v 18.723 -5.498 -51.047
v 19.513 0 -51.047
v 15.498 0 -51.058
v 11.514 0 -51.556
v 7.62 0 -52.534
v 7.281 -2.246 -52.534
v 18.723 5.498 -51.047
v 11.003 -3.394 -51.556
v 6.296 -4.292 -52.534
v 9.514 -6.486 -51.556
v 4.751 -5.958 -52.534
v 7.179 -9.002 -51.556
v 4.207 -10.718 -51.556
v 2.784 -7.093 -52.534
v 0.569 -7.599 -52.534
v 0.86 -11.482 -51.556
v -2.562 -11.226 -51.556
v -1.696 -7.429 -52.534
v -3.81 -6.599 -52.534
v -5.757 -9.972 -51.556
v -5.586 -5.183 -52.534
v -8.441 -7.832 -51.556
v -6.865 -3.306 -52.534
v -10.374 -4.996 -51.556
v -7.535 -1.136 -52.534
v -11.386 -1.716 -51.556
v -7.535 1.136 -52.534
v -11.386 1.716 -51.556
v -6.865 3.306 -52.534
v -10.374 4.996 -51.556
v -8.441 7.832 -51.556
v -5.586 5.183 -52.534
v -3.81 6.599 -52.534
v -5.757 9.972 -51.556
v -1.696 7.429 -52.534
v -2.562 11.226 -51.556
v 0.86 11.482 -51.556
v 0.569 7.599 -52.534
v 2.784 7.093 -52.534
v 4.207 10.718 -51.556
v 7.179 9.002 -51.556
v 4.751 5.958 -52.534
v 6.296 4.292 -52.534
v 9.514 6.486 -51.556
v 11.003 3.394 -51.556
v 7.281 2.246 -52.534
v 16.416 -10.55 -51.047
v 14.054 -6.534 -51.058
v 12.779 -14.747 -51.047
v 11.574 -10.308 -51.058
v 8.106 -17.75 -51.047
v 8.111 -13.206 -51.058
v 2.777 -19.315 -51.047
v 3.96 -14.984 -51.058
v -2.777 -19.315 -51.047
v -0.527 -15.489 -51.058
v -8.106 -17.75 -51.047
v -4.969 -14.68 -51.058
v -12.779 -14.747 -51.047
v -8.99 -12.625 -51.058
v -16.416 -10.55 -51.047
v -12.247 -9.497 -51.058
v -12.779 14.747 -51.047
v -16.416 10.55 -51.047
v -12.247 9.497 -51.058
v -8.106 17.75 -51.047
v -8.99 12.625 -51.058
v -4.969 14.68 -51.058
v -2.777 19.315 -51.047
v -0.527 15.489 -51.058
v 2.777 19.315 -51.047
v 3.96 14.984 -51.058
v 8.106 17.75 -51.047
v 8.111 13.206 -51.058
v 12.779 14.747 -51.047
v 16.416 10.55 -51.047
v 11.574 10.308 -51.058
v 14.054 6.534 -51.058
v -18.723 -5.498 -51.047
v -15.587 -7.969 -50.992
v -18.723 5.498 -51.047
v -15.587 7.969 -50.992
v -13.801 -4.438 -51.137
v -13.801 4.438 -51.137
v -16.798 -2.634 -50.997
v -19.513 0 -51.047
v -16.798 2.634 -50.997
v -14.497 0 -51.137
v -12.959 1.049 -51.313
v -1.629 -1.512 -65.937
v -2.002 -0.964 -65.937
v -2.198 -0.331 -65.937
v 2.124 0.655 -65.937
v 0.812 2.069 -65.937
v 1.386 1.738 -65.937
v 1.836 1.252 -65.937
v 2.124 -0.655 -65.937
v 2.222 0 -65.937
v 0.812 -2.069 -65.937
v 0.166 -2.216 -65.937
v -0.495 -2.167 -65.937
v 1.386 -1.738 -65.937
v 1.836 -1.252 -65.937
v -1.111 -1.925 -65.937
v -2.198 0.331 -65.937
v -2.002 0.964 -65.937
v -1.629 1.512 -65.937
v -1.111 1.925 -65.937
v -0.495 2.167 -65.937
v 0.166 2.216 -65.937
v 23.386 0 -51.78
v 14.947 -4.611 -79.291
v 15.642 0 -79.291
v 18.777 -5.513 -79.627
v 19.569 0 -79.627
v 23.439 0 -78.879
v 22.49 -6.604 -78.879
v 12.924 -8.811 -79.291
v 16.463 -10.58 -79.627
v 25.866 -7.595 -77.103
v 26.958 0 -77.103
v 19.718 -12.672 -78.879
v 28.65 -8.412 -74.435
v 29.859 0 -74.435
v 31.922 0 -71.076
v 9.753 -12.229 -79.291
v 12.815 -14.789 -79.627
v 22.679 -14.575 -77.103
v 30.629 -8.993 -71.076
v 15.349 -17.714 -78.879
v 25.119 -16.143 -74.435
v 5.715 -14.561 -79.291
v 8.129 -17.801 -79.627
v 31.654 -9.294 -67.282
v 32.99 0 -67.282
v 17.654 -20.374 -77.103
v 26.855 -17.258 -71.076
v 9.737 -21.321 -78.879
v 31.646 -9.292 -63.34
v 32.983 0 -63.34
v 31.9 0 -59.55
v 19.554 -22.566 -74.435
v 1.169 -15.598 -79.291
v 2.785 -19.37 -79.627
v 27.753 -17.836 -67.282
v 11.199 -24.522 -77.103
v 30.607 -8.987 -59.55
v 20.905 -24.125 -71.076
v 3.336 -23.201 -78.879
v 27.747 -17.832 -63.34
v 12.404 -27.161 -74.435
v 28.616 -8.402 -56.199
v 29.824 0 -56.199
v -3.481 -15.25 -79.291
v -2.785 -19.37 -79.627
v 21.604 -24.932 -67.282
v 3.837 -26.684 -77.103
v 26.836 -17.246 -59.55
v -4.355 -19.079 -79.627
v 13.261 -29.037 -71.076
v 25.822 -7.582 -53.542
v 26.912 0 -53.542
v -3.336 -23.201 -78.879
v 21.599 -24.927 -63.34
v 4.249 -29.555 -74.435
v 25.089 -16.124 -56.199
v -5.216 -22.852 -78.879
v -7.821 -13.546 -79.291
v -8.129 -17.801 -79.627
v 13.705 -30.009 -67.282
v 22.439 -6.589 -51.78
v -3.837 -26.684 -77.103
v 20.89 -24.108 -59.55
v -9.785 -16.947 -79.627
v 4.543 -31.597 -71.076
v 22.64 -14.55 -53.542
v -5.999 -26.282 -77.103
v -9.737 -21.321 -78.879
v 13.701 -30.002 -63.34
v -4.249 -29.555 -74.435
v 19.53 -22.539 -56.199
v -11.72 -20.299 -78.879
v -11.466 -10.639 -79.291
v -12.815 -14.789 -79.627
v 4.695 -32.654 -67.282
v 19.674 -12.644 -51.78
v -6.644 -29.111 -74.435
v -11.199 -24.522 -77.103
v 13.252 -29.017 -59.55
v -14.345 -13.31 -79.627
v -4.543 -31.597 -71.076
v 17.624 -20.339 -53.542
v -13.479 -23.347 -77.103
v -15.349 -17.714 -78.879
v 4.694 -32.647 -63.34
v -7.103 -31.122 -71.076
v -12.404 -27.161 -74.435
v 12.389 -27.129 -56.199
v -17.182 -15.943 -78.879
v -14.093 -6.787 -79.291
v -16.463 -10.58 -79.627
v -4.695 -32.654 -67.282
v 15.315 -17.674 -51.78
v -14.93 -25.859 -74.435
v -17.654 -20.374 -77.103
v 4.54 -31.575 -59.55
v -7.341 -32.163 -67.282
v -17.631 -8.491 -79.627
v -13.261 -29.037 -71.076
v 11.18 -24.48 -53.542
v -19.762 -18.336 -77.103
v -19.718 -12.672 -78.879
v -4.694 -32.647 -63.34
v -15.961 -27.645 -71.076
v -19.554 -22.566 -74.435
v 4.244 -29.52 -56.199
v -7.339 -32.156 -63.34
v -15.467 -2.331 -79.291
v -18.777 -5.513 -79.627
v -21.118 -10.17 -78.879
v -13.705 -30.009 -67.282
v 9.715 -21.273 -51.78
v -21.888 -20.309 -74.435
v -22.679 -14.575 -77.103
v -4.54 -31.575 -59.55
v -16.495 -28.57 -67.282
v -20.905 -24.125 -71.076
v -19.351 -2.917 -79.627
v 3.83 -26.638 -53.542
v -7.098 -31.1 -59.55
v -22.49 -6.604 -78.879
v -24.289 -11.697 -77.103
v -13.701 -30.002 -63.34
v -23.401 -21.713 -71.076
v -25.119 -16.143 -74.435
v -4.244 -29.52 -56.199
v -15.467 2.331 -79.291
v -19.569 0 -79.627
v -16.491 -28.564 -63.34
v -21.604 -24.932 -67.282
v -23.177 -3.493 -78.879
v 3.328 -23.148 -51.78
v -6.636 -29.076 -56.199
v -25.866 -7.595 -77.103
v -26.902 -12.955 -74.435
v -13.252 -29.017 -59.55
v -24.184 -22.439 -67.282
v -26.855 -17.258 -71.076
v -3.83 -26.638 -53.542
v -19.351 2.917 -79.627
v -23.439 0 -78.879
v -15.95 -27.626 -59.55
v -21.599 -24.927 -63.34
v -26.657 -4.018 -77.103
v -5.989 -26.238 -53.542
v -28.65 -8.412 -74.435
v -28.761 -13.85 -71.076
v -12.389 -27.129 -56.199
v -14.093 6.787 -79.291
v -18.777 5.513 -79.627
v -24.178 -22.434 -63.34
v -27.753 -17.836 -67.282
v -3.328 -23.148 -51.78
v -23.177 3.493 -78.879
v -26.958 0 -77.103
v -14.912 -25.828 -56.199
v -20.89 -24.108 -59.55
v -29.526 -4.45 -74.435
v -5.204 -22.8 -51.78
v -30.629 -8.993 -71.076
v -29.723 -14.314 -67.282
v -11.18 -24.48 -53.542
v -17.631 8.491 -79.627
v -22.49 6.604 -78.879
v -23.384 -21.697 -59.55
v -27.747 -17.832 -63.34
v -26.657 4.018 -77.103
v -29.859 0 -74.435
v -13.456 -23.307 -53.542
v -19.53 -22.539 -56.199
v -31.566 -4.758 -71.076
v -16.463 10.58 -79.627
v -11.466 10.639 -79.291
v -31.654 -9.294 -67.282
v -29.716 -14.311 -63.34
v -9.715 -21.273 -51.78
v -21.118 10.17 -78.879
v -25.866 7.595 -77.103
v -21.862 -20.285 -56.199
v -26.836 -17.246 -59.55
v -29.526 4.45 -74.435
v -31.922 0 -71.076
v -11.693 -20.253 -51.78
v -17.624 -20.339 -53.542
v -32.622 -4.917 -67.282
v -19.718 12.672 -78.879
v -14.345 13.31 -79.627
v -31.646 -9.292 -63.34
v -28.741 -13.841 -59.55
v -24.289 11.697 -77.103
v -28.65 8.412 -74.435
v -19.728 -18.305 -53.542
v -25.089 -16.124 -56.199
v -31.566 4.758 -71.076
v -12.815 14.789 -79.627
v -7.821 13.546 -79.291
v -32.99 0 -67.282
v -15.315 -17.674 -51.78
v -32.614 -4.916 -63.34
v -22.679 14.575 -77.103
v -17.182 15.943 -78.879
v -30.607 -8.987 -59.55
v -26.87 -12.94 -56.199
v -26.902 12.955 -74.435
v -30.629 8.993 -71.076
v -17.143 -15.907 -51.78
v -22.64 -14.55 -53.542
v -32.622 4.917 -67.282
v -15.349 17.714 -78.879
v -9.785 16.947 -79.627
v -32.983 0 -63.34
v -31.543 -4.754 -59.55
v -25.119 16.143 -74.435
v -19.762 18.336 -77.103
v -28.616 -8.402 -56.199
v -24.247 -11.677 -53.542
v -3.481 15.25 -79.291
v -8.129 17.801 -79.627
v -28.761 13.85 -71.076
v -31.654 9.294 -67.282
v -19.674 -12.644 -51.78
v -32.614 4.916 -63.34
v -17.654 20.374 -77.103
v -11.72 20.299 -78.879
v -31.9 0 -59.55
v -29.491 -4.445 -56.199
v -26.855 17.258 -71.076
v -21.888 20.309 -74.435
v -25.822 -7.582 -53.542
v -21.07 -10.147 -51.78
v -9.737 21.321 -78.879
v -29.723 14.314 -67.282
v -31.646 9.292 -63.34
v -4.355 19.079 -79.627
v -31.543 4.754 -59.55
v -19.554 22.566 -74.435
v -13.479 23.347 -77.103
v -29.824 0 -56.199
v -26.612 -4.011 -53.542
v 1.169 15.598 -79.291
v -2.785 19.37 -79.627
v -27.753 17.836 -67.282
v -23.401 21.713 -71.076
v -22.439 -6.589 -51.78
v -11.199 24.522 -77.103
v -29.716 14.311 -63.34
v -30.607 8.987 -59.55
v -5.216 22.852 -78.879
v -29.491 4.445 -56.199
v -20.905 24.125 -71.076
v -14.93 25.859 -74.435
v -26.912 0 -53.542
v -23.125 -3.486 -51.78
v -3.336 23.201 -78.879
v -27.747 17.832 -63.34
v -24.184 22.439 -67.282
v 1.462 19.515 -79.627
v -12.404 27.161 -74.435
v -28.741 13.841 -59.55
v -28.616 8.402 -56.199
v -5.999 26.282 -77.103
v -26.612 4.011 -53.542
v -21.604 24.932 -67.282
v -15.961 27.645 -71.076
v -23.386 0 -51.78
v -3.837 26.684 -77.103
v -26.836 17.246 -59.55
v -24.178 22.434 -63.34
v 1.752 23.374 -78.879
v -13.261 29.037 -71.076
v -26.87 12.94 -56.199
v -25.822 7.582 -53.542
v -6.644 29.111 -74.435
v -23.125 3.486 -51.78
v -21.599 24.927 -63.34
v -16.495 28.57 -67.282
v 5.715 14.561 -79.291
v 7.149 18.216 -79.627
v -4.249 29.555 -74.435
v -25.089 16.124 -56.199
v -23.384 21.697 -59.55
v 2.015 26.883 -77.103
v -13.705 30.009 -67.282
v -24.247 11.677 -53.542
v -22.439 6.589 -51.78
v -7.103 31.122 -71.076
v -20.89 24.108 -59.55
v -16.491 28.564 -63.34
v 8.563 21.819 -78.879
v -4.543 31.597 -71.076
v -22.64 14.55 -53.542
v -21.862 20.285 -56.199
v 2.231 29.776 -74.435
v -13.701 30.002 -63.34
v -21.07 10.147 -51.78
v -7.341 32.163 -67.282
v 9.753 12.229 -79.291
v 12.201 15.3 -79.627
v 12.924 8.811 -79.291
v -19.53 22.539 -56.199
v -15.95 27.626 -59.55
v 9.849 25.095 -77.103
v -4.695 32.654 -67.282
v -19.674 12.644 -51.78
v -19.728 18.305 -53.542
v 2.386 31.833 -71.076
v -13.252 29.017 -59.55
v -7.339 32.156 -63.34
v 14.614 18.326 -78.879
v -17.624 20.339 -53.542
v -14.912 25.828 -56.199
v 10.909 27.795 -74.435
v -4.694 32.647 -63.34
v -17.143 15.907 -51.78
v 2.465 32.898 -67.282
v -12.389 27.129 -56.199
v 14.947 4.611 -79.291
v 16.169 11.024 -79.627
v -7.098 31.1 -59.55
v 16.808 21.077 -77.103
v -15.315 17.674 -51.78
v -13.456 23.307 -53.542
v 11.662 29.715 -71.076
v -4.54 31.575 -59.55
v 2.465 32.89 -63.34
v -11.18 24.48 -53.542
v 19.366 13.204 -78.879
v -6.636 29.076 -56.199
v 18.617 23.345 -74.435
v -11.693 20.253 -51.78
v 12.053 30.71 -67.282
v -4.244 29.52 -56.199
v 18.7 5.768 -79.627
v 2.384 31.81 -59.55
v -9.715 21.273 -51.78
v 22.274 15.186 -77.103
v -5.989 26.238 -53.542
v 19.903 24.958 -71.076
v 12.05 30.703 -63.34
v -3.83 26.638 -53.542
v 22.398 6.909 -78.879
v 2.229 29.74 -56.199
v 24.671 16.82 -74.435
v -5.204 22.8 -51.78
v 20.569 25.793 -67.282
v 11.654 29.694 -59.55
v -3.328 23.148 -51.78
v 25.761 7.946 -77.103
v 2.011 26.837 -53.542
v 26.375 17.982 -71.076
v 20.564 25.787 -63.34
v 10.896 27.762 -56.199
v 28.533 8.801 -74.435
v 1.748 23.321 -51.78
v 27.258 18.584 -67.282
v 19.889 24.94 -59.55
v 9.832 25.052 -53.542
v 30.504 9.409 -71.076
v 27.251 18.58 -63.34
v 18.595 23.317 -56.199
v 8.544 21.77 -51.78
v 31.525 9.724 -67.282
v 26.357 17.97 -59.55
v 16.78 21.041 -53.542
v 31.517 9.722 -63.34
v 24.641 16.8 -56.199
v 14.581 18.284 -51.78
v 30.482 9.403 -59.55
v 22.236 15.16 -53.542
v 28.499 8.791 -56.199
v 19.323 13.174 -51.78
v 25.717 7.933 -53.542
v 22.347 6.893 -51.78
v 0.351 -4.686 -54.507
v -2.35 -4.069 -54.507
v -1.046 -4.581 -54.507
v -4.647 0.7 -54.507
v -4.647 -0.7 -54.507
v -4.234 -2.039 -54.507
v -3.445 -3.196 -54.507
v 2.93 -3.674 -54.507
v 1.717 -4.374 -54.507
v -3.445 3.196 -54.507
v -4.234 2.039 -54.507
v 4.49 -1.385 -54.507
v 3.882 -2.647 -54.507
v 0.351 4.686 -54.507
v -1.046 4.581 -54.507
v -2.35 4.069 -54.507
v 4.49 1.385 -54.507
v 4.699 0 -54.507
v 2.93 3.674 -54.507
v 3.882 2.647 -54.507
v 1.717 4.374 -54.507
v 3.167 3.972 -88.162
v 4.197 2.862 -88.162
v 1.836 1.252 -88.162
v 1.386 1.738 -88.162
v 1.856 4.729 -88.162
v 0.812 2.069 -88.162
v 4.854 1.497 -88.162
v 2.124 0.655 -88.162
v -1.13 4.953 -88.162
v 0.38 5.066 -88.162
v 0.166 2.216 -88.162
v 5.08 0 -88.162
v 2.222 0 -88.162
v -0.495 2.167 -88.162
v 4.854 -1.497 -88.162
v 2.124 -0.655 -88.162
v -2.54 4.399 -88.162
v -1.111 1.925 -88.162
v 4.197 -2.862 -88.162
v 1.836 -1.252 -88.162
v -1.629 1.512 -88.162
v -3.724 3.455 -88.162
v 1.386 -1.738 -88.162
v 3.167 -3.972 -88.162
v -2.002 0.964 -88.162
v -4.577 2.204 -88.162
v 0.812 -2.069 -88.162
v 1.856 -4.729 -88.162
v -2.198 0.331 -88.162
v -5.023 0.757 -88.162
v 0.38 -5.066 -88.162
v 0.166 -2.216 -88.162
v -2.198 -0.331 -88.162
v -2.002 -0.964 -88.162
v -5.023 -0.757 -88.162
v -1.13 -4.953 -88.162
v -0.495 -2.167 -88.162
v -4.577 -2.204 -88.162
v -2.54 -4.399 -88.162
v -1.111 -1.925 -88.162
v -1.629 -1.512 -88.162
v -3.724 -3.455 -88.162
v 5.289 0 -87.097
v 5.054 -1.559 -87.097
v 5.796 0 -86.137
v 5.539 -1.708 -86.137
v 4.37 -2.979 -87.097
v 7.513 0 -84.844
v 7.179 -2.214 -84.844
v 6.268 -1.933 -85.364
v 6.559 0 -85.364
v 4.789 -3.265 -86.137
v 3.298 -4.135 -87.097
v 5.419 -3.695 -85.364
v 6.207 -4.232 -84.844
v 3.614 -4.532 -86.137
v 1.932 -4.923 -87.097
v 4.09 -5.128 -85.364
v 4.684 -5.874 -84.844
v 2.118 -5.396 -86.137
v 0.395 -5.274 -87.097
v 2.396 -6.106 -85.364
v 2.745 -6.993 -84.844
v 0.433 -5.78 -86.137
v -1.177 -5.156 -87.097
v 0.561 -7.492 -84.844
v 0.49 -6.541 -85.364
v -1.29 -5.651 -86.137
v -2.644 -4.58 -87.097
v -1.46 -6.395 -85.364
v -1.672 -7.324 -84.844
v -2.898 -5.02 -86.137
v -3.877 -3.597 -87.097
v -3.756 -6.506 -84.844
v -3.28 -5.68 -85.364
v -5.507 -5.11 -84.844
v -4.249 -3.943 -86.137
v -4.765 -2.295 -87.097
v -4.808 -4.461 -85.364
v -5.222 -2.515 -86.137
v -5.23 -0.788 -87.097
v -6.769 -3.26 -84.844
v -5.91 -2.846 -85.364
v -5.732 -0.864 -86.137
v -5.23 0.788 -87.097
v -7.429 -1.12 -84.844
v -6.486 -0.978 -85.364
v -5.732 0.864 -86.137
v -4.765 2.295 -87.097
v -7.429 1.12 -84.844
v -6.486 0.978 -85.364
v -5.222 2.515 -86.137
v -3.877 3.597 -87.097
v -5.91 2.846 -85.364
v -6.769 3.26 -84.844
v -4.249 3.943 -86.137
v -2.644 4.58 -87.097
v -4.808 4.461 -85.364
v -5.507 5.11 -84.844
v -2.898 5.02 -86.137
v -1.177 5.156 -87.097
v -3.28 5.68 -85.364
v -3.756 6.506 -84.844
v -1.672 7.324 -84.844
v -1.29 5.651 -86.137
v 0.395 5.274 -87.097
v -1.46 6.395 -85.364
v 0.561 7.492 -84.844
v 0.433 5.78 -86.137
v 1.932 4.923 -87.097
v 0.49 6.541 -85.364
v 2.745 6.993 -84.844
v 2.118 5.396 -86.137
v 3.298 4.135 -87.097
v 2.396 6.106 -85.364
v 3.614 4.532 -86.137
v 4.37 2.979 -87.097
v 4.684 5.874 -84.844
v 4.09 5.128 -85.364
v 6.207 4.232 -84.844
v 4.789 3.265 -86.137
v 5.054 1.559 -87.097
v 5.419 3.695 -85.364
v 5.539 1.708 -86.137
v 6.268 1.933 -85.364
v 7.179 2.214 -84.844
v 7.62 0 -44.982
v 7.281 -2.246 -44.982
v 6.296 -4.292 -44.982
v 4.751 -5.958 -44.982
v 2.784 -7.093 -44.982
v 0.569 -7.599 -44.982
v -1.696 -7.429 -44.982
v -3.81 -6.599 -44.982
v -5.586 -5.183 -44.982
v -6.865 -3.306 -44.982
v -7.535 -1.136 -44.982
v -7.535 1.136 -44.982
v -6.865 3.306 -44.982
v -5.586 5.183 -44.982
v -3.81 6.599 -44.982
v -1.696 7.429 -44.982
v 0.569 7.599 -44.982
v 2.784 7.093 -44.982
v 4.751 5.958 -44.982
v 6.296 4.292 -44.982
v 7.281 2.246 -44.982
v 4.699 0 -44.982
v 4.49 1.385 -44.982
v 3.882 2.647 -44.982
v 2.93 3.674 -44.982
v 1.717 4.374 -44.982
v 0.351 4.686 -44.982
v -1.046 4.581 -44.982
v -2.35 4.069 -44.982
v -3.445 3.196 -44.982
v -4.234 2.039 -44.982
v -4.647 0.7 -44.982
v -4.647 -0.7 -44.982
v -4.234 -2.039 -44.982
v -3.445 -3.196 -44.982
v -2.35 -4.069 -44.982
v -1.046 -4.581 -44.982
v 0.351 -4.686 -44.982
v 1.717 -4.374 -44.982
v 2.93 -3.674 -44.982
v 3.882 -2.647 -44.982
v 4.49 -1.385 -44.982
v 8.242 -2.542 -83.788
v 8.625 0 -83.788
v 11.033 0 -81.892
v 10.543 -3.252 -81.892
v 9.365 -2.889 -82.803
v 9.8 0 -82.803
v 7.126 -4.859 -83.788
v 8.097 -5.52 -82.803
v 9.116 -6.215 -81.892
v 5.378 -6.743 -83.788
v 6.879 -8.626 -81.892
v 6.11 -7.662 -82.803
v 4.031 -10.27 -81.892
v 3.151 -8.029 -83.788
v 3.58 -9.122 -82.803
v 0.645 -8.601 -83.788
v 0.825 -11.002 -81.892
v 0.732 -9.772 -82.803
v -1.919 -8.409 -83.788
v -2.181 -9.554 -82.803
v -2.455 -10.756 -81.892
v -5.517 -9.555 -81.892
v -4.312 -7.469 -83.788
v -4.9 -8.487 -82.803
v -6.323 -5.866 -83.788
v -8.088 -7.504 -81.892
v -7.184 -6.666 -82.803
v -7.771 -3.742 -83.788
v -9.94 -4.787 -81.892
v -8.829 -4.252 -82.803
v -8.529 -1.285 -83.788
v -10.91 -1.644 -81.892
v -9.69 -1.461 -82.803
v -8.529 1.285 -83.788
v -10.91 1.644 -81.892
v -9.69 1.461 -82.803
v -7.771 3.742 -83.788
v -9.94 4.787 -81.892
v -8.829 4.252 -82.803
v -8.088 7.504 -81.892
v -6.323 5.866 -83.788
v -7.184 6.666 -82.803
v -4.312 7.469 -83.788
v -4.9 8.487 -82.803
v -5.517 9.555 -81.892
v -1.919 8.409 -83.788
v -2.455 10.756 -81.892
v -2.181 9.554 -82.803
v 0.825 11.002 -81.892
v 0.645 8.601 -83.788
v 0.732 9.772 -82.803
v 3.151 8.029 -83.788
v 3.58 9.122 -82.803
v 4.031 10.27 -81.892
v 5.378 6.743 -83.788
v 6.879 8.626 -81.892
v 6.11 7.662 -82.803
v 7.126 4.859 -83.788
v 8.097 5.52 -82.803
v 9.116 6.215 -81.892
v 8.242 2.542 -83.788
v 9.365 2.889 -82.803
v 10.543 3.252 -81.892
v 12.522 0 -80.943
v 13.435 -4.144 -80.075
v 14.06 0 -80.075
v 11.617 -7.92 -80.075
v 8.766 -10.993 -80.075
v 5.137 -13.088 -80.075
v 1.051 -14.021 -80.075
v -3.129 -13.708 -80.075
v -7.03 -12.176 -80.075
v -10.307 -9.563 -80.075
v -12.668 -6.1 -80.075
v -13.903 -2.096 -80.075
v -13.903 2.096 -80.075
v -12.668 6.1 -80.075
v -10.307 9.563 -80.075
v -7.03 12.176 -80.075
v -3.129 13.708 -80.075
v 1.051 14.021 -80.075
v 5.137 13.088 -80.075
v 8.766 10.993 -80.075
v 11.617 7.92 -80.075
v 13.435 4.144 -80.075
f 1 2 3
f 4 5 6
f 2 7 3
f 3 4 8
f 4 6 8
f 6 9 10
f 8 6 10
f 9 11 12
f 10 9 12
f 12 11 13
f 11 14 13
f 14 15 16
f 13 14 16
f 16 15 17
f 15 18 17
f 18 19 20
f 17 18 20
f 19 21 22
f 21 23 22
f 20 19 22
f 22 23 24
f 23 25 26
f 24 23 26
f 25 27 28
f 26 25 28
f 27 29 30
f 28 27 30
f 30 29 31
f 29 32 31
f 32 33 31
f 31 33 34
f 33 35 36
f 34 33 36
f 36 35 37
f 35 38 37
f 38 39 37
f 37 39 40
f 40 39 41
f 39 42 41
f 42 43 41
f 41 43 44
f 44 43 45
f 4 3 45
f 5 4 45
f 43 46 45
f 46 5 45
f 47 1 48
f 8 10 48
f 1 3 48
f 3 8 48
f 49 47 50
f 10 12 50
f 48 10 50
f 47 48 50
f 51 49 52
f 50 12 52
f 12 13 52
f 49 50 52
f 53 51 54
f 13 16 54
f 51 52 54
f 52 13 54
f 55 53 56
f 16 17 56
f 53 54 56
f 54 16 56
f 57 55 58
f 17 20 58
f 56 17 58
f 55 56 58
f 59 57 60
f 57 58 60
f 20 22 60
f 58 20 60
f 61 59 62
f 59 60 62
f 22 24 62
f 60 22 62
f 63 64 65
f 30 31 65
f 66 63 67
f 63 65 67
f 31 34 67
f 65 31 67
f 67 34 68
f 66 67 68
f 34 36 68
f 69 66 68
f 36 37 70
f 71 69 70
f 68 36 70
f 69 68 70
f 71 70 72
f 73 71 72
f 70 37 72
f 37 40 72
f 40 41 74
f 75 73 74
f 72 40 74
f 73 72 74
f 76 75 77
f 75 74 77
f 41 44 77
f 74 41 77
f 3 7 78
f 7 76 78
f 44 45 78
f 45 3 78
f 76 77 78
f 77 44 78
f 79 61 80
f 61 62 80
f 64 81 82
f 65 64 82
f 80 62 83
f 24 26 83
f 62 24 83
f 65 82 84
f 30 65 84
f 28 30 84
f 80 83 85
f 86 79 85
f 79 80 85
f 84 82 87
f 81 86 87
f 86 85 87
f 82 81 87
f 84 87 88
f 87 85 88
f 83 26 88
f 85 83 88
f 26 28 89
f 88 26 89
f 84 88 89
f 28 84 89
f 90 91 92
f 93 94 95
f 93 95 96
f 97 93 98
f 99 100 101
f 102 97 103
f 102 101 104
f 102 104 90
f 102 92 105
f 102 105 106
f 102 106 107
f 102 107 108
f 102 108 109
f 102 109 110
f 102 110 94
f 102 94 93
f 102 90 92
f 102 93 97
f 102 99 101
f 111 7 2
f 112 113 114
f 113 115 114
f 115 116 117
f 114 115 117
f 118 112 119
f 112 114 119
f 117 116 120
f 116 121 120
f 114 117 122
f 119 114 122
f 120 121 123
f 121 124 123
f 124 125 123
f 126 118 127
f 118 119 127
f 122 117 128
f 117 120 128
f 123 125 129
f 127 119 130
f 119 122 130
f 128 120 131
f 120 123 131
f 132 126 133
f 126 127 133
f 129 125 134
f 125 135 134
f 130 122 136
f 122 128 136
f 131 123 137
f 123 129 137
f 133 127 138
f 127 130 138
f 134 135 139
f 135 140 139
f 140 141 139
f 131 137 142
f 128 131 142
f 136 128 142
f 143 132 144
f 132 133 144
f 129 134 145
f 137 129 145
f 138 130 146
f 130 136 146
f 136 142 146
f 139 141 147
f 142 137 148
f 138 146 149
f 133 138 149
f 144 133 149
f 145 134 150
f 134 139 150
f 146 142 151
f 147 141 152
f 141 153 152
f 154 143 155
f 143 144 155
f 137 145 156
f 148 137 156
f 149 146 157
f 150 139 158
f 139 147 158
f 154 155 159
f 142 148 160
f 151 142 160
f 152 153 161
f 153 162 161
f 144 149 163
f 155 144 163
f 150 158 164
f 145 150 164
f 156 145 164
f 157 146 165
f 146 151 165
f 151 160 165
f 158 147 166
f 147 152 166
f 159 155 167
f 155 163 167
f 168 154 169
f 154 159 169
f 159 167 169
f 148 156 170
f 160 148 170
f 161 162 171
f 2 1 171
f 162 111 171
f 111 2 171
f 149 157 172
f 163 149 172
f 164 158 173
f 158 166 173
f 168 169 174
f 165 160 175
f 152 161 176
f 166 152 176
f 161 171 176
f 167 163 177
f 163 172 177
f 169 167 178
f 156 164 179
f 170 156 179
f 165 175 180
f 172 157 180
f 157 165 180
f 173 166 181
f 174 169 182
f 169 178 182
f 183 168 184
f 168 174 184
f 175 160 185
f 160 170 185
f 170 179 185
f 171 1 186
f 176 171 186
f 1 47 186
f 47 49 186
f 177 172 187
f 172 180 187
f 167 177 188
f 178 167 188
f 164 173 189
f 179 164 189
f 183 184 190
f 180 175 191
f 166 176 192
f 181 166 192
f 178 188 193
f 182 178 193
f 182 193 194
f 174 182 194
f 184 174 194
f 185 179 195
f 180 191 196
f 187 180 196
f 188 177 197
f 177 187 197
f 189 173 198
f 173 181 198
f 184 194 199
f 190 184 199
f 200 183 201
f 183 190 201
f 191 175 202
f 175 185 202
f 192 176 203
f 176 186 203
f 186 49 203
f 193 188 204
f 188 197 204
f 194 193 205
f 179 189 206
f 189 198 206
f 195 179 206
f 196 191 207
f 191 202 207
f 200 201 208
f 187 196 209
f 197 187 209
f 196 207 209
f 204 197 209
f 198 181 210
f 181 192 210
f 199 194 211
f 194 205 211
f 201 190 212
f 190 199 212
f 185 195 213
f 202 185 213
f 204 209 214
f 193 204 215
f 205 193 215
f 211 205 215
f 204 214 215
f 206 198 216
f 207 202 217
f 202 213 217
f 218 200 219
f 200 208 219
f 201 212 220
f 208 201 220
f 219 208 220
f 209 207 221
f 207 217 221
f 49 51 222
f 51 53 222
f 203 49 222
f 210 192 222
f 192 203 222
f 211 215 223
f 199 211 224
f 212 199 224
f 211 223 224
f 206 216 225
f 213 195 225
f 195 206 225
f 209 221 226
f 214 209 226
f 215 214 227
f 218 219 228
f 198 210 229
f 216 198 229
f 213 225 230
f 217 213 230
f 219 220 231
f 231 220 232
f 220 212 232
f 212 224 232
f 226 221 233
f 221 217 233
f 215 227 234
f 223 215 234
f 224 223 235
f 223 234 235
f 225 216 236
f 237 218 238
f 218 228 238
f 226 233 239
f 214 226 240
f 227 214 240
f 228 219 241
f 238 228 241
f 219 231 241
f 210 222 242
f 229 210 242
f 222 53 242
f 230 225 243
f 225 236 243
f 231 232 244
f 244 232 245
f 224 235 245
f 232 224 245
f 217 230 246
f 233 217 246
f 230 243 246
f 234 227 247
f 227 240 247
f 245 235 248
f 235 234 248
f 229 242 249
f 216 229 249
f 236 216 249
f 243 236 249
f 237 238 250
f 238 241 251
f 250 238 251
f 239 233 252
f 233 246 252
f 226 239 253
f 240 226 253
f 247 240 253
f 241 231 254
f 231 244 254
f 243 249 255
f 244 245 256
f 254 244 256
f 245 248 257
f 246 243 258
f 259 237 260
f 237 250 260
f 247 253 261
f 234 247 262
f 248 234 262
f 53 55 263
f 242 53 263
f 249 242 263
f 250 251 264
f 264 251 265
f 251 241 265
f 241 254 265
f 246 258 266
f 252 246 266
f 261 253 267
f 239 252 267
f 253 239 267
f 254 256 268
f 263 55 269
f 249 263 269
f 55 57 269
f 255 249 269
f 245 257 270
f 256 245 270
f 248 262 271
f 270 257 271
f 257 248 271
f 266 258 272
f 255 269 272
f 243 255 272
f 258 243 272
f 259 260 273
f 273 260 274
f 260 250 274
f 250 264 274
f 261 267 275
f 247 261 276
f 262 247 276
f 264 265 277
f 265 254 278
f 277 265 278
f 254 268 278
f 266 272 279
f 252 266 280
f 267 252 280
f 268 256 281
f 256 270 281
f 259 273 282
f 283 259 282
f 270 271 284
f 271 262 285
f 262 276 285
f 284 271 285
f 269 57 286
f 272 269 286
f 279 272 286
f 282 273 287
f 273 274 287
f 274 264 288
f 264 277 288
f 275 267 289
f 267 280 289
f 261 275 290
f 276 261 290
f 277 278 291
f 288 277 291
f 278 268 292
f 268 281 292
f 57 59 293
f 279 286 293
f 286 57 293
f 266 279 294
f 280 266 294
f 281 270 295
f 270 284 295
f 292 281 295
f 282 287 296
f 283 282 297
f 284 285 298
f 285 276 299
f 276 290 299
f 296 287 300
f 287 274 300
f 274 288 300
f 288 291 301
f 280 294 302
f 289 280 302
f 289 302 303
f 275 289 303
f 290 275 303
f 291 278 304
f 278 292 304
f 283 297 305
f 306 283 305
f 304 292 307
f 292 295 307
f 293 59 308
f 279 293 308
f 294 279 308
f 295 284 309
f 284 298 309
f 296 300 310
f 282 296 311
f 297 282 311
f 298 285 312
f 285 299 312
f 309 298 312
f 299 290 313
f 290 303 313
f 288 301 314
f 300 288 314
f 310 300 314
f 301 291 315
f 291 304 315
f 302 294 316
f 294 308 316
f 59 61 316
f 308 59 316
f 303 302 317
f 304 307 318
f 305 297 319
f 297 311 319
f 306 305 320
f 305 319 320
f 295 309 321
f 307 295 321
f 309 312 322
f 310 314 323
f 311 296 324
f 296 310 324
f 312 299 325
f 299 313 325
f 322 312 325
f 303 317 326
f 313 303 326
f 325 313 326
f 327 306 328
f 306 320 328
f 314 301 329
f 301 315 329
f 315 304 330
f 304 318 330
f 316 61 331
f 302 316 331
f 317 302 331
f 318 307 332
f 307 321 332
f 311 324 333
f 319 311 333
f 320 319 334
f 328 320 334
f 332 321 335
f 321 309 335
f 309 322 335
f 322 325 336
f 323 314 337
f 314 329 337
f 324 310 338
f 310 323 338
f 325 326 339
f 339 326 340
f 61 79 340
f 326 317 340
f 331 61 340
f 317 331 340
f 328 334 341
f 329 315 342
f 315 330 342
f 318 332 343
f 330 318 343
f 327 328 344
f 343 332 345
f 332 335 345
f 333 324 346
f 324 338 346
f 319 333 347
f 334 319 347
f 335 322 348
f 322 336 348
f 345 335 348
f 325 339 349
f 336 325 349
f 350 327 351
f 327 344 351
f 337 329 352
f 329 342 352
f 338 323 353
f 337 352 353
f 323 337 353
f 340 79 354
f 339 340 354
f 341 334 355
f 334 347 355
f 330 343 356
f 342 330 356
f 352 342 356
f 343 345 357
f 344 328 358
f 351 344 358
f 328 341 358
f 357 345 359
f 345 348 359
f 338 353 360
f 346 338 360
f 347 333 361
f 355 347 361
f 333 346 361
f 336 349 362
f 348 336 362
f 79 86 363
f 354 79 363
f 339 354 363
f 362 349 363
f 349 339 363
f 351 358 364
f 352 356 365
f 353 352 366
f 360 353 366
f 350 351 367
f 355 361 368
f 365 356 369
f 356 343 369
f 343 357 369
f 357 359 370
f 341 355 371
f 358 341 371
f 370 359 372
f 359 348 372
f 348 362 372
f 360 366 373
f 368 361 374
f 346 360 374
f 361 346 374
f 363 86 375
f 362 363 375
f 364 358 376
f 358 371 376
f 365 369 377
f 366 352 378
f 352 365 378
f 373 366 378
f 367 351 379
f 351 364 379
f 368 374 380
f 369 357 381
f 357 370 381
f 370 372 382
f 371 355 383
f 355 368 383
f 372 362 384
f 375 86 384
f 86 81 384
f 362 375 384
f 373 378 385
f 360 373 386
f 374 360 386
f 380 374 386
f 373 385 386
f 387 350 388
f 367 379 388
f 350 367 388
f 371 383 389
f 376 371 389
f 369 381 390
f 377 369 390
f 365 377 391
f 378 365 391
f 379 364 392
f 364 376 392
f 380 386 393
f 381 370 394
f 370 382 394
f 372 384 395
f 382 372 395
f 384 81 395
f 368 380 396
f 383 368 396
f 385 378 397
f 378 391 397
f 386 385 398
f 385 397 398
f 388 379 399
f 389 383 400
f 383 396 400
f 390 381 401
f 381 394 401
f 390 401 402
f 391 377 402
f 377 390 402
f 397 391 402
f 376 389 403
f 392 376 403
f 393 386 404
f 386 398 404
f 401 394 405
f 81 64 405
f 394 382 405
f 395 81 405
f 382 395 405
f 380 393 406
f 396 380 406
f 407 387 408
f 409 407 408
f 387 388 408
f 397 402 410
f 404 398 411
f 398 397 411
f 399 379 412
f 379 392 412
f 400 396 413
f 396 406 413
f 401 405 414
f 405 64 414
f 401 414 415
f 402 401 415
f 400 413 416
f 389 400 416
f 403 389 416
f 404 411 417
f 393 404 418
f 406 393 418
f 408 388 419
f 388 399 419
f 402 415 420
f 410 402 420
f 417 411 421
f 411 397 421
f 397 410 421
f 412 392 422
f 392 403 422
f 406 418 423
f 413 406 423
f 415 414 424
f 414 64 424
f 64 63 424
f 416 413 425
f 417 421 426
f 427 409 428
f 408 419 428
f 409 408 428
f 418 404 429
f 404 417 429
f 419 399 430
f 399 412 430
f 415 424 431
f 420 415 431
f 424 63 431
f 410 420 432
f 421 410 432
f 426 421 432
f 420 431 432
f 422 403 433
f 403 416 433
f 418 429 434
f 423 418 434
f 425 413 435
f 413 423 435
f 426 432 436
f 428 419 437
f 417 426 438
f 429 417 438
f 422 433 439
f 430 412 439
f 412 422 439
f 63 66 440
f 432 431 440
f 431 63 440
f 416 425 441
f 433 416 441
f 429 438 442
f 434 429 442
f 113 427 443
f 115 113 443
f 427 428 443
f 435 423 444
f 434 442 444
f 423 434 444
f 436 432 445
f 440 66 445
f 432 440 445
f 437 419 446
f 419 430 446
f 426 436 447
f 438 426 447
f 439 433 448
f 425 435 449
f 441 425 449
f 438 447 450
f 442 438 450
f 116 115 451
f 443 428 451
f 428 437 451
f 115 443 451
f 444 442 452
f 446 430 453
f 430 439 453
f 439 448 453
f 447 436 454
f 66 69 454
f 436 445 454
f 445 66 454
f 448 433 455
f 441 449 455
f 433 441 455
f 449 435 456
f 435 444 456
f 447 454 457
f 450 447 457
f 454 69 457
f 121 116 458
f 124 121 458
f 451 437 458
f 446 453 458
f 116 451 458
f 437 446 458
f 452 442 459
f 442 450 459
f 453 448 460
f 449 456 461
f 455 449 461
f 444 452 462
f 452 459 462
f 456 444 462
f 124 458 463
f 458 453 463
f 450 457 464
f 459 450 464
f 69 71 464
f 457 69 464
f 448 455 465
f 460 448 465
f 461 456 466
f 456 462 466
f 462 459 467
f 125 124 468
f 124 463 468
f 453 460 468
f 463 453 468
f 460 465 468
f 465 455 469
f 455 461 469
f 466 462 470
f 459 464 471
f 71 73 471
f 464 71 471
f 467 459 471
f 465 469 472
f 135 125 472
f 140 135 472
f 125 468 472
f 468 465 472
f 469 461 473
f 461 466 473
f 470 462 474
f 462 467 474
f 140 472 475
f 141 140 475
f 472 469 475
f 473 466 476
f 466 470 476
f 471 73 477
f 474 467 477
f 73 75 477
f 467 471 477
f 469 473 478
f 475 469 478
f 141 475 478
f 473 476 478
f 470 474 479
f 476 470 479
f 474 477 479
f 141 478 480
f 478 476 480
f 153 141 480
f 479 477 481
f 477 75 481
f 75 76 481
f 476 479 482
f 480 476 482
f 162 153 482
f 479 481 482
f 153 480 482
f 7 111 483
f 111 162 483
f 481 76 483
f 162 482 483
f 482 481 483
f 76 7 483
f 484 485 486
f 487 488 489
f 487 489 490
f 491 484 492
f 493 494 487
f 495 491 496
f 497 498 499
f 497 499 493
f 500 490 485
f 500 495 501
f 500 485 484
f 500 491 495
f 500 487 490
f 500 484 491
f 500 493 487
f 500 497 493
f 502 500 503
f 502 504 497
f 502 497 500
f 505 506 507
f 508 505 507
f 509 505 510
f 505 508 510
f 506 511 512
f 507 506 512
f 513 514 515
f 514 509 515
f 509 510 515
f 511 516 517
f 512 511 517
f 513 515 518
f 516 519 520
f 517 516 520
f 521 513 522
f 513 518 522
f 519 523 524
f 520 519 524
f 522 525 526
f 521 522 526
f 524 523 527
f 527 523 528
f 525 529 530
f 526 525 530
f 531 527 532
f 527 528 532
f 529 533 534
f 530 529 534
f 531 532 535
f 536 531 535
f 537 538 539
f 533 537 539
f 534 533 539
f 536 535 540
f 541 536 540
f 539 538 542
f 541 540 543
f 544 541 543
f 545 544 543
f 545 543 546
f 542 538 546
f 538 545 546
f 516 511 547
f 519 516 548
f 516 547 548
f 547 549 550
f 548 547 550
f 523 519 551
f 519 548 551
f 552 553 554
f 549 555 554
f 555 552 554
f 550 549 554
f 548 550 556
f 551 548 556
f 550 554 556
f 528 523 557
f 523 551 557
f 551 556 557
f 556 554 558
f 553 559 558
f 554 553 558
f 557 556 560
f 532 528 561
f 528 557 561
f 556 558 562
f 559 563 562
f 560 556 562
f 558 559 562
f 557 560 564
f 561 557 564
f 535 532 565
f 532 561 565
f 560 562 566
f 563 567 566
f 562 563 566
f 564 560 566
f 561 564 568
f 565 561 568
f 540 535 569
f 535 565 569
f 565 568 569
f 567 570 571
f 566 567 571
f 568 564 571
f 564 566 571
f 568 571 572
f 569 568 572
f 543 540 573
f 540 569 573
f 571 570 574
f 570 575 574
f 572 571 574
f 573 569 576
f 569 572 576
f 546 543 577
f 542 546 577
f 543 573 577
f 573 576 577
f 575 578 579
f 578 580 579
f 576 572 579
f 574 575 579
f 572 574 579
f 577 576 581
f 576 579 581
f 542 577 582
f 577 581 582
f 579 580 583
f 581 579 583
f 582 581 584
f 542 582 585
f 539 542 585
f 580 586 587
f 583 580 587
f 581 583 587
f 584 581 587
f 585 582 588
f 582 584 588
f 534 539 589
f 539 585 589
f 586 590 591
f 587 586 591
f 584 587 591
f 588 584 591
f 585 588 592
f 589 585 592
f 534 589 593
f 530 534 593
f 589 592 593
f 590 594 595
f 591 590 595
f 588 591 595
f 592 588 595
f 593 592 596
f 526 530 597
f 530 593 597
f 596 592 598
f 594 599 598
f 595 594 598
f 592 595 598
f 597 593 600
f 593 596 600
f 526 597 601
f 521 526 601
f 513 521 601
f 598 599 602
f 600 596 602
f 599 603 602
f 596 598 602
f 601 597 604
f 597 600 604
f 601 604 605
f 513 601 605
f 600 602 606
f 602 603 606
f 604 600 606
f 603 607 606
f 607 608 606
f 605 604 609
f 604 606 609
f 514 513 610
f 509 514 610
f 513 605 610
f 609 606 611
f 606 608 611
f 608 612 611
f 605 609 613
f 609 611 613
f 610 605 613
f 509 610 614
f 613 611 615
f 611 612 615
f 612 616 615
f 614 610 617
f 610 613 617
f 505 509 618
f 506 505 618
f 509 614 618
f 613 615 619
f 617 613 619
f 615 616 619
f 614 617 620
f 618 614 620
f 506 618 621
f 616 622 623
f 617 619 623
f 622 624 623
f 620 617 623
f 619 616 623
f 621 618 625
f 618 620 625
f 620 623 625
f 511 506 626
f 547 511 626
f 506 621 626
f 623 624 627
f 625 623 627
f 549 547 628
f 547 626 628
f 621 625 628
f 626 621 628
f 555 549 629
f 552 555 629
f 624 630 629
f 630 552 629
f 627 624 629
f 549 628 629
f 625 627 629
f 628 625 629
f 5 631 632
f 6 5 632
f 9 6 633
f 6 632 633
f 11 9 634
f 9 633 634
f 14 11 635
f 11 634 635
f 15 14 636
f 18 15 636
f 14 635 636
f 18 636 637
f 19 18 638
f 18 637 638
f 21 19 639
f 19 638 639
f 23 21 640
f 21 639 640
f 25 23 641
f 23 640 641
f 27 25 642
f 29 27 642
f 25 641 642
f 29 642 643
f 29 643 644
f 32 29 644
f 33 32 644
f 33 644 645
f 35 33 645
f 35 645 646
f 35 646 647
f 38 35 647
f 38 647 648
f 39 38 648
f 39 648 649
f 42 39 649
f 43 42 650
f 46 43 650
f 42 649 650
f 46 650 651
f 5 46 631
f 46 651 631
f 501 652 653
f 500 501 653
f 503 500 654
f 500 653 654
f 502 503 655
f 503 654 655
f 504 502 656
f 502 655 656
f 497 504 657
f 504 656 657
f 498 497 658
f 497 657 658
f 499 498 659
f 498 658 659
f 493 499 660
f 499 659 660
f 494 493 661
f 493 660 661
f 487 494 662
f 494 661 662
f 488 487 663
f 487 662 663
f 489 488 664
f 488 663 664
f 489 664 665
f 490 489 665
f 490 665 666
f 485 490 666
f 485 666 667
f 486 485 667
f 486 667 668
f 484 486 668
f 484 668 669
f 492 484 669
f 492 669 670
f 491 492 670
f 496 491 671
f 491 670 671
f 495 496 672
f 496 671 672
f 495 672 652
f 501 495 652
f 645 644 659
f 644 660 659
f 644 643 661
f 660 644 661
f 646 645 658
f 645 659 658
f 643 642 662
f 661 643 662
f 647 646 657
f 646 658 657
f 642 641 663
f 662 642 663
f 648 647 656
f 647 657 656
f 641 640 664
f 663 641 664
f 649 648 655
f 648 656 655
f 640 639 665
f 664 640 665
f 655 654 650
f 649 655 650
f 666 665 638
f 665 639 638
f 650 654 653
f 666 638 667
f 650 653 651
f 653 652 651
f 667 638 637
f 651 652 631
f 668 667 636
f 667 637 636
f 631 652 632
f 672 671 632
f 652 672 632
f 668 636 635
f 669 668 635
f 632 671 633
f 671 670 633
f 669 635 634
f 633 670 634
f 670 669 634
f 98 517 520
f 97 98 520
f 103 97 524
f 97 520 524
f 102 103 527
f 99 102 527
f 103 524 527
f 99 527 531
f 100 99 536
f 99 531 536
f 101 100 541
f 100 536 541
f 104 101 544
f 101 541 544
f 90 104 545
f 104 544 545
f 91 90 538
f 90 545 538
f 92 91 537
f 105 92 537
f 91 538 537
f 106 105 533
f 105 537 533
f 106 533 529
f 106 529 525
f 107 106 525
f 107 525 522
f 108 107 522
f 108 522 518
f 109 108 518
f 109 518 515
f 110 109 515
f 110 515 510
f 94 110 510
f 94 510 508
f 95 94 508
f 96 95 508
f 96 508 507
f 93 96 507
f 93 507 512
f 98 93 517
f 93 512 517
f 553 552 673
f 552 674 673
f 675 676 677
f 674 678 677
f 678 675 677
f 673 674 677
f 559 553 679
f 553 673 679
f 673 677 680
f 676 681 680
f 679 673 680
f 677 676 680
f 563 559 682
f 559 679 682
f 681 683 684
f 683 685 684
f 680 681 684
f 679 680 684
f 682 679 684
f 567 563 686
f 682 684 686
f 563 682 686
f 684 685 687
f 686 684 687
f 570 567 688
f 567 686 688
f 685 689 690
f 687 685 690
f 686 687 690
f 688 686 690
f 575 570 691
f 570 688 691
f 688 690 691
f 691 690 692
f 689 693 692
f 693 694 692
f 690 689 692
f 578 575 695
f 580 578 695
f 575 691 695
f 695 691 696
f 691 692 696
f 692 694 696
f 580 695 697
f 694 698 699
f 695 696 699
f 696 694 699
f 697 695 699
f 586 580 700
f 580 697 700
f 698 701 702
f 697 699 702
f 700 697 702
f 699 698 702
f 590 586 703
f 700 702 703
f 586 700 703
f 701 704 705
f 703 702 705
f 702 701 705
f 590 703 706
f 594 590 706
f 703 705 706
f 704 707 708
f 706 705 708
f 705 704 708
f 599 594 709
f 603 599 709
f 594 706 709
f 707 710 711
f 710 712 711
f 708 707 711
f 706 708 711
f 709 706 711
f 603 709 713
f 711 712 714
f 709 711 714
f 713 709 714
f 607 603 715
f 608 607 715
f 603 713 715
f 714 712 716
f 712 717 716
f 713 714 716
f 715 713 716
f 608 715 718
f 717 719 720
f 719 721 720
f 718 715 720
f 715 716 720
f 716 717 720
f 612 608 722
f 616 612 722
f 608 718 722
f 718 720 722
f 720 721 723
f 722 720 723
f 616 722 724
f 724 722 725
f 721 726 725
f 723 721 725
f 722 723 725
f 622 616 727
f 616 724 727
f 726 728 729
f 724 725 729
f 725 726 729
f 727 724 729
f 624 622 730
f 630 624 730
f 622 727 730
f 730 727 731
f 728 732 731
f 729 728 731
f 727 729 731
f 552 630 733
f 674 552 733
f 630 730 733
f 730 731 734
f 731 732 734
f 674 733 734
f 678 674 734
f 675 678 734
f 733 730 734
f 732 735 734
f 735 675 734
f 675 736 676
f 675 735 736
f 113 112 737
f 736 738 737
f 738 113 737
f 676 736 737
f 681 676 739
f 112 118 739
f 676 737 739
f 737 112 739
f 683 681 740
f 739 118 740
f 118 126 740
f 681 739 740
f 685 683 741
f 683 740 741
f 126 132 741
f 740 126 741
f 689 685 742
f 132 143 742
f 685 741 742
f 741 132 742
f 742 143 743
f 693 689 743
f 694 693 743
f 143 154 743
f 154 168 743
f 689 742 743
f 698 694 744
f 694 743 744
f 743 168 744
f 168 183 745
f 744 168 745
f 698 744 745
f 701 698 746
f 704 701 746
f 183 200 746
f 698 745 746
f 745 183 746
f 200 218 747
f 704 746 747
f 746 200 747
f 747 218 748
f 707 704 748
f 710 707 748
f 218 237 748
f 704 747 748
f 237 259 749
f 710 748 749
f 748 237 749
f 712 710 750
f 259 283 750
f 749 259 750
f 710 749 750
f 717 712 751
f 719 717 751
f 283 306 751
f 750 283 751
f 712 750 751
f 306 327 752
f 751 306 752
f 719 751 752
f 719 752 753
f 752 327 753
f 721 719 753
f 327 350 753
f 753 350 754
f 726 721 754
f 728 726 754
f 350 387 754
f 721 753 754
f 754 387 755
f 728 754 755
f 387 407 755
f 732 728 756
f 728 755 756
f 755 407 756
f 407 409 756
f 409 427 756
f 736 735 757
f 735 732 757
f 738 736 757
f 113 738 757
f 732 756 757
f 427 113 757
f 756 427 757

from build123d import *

# Parameters (mm, degrees)
F2_R        = 4.699
F3_DEPTH    = 9.525
F4_R        = 2.2225
F1_FACE_R   = 7.62
F1_FACE_R_2 = 4.699
F5_DEPTH    = 22.225


# Not quite as in the source:
# - a feature names something its author has since deleted; it is built from what else it names


with BuildPart() as f1:
    # F0 (on Front) → F1 (revolve)
    with BuildSketch(Plane.XZ):
        with BuildLine():
            ThreePointArc((11.0330758616, -81.8918719888), (13.2853990557, -80.4988733509), (15.6419463456, -79.2905315757))
            ThreePointArc((15.6419463456, -79.2905315757), (32.9902043329, -67.2816433685), (19.5133984089, -51.0473847389))
            ThreePointArc((19.5133984089, -51.0473847389), (13.498708034, -51.2466242985), (7.62, -52.533864975))
            Line((7.62, -52.533864975), (7.62, -44.9823363346))
            Line((7.62, -44.9823363346), (0, -44.9823363346))
            Line((0, -44.9823363346), (0, -88.1623363346))
            Line((0, -88.1623363346), (5.08, -88.1623363346))
            ThreePointArc((5.08, -88.1623363346), (5.7963291238, -86.1365407799), (7.512565547, -84.843672812))
            ThreePointArc((7.512565547, -84.843672812), (9.2048459257, -83.286701243), (11.0330758616, -81.8918719888))
        make_face()
    revolve(axis=Axis((0, 0, -66.5723363346), (0, 0, -1)))

    # F2 (on face) → F3 (cut)
    with BuildSketch(Plane.XY.offset(-44.9823363346)):
        Circle(F2_R)
    extrude(amount=-F3_DEPTH, mode=Mode.SUBTRACT)

    # F4 (on face) + F1_face (on face) → F5 (cut)
    with BuildSketch(Plane(origin=(0, 0, -88.1623363346), x_dir=(1, 0, 0), z_dir=(0, 0, -1))):
        Circle(F4_R)
    with BuildSketch(Plane.XY.offset(-44.9823363346)):
        Circle(F1_FACE_R)
        Circle(F1_FACE_R_2, mode=Mode.SUBTRACT)
    extrude(amount=-F5_DEPTH, dir=(0, 0, -1), mode=Mode.SUBTRACT)


solid = f1.part
